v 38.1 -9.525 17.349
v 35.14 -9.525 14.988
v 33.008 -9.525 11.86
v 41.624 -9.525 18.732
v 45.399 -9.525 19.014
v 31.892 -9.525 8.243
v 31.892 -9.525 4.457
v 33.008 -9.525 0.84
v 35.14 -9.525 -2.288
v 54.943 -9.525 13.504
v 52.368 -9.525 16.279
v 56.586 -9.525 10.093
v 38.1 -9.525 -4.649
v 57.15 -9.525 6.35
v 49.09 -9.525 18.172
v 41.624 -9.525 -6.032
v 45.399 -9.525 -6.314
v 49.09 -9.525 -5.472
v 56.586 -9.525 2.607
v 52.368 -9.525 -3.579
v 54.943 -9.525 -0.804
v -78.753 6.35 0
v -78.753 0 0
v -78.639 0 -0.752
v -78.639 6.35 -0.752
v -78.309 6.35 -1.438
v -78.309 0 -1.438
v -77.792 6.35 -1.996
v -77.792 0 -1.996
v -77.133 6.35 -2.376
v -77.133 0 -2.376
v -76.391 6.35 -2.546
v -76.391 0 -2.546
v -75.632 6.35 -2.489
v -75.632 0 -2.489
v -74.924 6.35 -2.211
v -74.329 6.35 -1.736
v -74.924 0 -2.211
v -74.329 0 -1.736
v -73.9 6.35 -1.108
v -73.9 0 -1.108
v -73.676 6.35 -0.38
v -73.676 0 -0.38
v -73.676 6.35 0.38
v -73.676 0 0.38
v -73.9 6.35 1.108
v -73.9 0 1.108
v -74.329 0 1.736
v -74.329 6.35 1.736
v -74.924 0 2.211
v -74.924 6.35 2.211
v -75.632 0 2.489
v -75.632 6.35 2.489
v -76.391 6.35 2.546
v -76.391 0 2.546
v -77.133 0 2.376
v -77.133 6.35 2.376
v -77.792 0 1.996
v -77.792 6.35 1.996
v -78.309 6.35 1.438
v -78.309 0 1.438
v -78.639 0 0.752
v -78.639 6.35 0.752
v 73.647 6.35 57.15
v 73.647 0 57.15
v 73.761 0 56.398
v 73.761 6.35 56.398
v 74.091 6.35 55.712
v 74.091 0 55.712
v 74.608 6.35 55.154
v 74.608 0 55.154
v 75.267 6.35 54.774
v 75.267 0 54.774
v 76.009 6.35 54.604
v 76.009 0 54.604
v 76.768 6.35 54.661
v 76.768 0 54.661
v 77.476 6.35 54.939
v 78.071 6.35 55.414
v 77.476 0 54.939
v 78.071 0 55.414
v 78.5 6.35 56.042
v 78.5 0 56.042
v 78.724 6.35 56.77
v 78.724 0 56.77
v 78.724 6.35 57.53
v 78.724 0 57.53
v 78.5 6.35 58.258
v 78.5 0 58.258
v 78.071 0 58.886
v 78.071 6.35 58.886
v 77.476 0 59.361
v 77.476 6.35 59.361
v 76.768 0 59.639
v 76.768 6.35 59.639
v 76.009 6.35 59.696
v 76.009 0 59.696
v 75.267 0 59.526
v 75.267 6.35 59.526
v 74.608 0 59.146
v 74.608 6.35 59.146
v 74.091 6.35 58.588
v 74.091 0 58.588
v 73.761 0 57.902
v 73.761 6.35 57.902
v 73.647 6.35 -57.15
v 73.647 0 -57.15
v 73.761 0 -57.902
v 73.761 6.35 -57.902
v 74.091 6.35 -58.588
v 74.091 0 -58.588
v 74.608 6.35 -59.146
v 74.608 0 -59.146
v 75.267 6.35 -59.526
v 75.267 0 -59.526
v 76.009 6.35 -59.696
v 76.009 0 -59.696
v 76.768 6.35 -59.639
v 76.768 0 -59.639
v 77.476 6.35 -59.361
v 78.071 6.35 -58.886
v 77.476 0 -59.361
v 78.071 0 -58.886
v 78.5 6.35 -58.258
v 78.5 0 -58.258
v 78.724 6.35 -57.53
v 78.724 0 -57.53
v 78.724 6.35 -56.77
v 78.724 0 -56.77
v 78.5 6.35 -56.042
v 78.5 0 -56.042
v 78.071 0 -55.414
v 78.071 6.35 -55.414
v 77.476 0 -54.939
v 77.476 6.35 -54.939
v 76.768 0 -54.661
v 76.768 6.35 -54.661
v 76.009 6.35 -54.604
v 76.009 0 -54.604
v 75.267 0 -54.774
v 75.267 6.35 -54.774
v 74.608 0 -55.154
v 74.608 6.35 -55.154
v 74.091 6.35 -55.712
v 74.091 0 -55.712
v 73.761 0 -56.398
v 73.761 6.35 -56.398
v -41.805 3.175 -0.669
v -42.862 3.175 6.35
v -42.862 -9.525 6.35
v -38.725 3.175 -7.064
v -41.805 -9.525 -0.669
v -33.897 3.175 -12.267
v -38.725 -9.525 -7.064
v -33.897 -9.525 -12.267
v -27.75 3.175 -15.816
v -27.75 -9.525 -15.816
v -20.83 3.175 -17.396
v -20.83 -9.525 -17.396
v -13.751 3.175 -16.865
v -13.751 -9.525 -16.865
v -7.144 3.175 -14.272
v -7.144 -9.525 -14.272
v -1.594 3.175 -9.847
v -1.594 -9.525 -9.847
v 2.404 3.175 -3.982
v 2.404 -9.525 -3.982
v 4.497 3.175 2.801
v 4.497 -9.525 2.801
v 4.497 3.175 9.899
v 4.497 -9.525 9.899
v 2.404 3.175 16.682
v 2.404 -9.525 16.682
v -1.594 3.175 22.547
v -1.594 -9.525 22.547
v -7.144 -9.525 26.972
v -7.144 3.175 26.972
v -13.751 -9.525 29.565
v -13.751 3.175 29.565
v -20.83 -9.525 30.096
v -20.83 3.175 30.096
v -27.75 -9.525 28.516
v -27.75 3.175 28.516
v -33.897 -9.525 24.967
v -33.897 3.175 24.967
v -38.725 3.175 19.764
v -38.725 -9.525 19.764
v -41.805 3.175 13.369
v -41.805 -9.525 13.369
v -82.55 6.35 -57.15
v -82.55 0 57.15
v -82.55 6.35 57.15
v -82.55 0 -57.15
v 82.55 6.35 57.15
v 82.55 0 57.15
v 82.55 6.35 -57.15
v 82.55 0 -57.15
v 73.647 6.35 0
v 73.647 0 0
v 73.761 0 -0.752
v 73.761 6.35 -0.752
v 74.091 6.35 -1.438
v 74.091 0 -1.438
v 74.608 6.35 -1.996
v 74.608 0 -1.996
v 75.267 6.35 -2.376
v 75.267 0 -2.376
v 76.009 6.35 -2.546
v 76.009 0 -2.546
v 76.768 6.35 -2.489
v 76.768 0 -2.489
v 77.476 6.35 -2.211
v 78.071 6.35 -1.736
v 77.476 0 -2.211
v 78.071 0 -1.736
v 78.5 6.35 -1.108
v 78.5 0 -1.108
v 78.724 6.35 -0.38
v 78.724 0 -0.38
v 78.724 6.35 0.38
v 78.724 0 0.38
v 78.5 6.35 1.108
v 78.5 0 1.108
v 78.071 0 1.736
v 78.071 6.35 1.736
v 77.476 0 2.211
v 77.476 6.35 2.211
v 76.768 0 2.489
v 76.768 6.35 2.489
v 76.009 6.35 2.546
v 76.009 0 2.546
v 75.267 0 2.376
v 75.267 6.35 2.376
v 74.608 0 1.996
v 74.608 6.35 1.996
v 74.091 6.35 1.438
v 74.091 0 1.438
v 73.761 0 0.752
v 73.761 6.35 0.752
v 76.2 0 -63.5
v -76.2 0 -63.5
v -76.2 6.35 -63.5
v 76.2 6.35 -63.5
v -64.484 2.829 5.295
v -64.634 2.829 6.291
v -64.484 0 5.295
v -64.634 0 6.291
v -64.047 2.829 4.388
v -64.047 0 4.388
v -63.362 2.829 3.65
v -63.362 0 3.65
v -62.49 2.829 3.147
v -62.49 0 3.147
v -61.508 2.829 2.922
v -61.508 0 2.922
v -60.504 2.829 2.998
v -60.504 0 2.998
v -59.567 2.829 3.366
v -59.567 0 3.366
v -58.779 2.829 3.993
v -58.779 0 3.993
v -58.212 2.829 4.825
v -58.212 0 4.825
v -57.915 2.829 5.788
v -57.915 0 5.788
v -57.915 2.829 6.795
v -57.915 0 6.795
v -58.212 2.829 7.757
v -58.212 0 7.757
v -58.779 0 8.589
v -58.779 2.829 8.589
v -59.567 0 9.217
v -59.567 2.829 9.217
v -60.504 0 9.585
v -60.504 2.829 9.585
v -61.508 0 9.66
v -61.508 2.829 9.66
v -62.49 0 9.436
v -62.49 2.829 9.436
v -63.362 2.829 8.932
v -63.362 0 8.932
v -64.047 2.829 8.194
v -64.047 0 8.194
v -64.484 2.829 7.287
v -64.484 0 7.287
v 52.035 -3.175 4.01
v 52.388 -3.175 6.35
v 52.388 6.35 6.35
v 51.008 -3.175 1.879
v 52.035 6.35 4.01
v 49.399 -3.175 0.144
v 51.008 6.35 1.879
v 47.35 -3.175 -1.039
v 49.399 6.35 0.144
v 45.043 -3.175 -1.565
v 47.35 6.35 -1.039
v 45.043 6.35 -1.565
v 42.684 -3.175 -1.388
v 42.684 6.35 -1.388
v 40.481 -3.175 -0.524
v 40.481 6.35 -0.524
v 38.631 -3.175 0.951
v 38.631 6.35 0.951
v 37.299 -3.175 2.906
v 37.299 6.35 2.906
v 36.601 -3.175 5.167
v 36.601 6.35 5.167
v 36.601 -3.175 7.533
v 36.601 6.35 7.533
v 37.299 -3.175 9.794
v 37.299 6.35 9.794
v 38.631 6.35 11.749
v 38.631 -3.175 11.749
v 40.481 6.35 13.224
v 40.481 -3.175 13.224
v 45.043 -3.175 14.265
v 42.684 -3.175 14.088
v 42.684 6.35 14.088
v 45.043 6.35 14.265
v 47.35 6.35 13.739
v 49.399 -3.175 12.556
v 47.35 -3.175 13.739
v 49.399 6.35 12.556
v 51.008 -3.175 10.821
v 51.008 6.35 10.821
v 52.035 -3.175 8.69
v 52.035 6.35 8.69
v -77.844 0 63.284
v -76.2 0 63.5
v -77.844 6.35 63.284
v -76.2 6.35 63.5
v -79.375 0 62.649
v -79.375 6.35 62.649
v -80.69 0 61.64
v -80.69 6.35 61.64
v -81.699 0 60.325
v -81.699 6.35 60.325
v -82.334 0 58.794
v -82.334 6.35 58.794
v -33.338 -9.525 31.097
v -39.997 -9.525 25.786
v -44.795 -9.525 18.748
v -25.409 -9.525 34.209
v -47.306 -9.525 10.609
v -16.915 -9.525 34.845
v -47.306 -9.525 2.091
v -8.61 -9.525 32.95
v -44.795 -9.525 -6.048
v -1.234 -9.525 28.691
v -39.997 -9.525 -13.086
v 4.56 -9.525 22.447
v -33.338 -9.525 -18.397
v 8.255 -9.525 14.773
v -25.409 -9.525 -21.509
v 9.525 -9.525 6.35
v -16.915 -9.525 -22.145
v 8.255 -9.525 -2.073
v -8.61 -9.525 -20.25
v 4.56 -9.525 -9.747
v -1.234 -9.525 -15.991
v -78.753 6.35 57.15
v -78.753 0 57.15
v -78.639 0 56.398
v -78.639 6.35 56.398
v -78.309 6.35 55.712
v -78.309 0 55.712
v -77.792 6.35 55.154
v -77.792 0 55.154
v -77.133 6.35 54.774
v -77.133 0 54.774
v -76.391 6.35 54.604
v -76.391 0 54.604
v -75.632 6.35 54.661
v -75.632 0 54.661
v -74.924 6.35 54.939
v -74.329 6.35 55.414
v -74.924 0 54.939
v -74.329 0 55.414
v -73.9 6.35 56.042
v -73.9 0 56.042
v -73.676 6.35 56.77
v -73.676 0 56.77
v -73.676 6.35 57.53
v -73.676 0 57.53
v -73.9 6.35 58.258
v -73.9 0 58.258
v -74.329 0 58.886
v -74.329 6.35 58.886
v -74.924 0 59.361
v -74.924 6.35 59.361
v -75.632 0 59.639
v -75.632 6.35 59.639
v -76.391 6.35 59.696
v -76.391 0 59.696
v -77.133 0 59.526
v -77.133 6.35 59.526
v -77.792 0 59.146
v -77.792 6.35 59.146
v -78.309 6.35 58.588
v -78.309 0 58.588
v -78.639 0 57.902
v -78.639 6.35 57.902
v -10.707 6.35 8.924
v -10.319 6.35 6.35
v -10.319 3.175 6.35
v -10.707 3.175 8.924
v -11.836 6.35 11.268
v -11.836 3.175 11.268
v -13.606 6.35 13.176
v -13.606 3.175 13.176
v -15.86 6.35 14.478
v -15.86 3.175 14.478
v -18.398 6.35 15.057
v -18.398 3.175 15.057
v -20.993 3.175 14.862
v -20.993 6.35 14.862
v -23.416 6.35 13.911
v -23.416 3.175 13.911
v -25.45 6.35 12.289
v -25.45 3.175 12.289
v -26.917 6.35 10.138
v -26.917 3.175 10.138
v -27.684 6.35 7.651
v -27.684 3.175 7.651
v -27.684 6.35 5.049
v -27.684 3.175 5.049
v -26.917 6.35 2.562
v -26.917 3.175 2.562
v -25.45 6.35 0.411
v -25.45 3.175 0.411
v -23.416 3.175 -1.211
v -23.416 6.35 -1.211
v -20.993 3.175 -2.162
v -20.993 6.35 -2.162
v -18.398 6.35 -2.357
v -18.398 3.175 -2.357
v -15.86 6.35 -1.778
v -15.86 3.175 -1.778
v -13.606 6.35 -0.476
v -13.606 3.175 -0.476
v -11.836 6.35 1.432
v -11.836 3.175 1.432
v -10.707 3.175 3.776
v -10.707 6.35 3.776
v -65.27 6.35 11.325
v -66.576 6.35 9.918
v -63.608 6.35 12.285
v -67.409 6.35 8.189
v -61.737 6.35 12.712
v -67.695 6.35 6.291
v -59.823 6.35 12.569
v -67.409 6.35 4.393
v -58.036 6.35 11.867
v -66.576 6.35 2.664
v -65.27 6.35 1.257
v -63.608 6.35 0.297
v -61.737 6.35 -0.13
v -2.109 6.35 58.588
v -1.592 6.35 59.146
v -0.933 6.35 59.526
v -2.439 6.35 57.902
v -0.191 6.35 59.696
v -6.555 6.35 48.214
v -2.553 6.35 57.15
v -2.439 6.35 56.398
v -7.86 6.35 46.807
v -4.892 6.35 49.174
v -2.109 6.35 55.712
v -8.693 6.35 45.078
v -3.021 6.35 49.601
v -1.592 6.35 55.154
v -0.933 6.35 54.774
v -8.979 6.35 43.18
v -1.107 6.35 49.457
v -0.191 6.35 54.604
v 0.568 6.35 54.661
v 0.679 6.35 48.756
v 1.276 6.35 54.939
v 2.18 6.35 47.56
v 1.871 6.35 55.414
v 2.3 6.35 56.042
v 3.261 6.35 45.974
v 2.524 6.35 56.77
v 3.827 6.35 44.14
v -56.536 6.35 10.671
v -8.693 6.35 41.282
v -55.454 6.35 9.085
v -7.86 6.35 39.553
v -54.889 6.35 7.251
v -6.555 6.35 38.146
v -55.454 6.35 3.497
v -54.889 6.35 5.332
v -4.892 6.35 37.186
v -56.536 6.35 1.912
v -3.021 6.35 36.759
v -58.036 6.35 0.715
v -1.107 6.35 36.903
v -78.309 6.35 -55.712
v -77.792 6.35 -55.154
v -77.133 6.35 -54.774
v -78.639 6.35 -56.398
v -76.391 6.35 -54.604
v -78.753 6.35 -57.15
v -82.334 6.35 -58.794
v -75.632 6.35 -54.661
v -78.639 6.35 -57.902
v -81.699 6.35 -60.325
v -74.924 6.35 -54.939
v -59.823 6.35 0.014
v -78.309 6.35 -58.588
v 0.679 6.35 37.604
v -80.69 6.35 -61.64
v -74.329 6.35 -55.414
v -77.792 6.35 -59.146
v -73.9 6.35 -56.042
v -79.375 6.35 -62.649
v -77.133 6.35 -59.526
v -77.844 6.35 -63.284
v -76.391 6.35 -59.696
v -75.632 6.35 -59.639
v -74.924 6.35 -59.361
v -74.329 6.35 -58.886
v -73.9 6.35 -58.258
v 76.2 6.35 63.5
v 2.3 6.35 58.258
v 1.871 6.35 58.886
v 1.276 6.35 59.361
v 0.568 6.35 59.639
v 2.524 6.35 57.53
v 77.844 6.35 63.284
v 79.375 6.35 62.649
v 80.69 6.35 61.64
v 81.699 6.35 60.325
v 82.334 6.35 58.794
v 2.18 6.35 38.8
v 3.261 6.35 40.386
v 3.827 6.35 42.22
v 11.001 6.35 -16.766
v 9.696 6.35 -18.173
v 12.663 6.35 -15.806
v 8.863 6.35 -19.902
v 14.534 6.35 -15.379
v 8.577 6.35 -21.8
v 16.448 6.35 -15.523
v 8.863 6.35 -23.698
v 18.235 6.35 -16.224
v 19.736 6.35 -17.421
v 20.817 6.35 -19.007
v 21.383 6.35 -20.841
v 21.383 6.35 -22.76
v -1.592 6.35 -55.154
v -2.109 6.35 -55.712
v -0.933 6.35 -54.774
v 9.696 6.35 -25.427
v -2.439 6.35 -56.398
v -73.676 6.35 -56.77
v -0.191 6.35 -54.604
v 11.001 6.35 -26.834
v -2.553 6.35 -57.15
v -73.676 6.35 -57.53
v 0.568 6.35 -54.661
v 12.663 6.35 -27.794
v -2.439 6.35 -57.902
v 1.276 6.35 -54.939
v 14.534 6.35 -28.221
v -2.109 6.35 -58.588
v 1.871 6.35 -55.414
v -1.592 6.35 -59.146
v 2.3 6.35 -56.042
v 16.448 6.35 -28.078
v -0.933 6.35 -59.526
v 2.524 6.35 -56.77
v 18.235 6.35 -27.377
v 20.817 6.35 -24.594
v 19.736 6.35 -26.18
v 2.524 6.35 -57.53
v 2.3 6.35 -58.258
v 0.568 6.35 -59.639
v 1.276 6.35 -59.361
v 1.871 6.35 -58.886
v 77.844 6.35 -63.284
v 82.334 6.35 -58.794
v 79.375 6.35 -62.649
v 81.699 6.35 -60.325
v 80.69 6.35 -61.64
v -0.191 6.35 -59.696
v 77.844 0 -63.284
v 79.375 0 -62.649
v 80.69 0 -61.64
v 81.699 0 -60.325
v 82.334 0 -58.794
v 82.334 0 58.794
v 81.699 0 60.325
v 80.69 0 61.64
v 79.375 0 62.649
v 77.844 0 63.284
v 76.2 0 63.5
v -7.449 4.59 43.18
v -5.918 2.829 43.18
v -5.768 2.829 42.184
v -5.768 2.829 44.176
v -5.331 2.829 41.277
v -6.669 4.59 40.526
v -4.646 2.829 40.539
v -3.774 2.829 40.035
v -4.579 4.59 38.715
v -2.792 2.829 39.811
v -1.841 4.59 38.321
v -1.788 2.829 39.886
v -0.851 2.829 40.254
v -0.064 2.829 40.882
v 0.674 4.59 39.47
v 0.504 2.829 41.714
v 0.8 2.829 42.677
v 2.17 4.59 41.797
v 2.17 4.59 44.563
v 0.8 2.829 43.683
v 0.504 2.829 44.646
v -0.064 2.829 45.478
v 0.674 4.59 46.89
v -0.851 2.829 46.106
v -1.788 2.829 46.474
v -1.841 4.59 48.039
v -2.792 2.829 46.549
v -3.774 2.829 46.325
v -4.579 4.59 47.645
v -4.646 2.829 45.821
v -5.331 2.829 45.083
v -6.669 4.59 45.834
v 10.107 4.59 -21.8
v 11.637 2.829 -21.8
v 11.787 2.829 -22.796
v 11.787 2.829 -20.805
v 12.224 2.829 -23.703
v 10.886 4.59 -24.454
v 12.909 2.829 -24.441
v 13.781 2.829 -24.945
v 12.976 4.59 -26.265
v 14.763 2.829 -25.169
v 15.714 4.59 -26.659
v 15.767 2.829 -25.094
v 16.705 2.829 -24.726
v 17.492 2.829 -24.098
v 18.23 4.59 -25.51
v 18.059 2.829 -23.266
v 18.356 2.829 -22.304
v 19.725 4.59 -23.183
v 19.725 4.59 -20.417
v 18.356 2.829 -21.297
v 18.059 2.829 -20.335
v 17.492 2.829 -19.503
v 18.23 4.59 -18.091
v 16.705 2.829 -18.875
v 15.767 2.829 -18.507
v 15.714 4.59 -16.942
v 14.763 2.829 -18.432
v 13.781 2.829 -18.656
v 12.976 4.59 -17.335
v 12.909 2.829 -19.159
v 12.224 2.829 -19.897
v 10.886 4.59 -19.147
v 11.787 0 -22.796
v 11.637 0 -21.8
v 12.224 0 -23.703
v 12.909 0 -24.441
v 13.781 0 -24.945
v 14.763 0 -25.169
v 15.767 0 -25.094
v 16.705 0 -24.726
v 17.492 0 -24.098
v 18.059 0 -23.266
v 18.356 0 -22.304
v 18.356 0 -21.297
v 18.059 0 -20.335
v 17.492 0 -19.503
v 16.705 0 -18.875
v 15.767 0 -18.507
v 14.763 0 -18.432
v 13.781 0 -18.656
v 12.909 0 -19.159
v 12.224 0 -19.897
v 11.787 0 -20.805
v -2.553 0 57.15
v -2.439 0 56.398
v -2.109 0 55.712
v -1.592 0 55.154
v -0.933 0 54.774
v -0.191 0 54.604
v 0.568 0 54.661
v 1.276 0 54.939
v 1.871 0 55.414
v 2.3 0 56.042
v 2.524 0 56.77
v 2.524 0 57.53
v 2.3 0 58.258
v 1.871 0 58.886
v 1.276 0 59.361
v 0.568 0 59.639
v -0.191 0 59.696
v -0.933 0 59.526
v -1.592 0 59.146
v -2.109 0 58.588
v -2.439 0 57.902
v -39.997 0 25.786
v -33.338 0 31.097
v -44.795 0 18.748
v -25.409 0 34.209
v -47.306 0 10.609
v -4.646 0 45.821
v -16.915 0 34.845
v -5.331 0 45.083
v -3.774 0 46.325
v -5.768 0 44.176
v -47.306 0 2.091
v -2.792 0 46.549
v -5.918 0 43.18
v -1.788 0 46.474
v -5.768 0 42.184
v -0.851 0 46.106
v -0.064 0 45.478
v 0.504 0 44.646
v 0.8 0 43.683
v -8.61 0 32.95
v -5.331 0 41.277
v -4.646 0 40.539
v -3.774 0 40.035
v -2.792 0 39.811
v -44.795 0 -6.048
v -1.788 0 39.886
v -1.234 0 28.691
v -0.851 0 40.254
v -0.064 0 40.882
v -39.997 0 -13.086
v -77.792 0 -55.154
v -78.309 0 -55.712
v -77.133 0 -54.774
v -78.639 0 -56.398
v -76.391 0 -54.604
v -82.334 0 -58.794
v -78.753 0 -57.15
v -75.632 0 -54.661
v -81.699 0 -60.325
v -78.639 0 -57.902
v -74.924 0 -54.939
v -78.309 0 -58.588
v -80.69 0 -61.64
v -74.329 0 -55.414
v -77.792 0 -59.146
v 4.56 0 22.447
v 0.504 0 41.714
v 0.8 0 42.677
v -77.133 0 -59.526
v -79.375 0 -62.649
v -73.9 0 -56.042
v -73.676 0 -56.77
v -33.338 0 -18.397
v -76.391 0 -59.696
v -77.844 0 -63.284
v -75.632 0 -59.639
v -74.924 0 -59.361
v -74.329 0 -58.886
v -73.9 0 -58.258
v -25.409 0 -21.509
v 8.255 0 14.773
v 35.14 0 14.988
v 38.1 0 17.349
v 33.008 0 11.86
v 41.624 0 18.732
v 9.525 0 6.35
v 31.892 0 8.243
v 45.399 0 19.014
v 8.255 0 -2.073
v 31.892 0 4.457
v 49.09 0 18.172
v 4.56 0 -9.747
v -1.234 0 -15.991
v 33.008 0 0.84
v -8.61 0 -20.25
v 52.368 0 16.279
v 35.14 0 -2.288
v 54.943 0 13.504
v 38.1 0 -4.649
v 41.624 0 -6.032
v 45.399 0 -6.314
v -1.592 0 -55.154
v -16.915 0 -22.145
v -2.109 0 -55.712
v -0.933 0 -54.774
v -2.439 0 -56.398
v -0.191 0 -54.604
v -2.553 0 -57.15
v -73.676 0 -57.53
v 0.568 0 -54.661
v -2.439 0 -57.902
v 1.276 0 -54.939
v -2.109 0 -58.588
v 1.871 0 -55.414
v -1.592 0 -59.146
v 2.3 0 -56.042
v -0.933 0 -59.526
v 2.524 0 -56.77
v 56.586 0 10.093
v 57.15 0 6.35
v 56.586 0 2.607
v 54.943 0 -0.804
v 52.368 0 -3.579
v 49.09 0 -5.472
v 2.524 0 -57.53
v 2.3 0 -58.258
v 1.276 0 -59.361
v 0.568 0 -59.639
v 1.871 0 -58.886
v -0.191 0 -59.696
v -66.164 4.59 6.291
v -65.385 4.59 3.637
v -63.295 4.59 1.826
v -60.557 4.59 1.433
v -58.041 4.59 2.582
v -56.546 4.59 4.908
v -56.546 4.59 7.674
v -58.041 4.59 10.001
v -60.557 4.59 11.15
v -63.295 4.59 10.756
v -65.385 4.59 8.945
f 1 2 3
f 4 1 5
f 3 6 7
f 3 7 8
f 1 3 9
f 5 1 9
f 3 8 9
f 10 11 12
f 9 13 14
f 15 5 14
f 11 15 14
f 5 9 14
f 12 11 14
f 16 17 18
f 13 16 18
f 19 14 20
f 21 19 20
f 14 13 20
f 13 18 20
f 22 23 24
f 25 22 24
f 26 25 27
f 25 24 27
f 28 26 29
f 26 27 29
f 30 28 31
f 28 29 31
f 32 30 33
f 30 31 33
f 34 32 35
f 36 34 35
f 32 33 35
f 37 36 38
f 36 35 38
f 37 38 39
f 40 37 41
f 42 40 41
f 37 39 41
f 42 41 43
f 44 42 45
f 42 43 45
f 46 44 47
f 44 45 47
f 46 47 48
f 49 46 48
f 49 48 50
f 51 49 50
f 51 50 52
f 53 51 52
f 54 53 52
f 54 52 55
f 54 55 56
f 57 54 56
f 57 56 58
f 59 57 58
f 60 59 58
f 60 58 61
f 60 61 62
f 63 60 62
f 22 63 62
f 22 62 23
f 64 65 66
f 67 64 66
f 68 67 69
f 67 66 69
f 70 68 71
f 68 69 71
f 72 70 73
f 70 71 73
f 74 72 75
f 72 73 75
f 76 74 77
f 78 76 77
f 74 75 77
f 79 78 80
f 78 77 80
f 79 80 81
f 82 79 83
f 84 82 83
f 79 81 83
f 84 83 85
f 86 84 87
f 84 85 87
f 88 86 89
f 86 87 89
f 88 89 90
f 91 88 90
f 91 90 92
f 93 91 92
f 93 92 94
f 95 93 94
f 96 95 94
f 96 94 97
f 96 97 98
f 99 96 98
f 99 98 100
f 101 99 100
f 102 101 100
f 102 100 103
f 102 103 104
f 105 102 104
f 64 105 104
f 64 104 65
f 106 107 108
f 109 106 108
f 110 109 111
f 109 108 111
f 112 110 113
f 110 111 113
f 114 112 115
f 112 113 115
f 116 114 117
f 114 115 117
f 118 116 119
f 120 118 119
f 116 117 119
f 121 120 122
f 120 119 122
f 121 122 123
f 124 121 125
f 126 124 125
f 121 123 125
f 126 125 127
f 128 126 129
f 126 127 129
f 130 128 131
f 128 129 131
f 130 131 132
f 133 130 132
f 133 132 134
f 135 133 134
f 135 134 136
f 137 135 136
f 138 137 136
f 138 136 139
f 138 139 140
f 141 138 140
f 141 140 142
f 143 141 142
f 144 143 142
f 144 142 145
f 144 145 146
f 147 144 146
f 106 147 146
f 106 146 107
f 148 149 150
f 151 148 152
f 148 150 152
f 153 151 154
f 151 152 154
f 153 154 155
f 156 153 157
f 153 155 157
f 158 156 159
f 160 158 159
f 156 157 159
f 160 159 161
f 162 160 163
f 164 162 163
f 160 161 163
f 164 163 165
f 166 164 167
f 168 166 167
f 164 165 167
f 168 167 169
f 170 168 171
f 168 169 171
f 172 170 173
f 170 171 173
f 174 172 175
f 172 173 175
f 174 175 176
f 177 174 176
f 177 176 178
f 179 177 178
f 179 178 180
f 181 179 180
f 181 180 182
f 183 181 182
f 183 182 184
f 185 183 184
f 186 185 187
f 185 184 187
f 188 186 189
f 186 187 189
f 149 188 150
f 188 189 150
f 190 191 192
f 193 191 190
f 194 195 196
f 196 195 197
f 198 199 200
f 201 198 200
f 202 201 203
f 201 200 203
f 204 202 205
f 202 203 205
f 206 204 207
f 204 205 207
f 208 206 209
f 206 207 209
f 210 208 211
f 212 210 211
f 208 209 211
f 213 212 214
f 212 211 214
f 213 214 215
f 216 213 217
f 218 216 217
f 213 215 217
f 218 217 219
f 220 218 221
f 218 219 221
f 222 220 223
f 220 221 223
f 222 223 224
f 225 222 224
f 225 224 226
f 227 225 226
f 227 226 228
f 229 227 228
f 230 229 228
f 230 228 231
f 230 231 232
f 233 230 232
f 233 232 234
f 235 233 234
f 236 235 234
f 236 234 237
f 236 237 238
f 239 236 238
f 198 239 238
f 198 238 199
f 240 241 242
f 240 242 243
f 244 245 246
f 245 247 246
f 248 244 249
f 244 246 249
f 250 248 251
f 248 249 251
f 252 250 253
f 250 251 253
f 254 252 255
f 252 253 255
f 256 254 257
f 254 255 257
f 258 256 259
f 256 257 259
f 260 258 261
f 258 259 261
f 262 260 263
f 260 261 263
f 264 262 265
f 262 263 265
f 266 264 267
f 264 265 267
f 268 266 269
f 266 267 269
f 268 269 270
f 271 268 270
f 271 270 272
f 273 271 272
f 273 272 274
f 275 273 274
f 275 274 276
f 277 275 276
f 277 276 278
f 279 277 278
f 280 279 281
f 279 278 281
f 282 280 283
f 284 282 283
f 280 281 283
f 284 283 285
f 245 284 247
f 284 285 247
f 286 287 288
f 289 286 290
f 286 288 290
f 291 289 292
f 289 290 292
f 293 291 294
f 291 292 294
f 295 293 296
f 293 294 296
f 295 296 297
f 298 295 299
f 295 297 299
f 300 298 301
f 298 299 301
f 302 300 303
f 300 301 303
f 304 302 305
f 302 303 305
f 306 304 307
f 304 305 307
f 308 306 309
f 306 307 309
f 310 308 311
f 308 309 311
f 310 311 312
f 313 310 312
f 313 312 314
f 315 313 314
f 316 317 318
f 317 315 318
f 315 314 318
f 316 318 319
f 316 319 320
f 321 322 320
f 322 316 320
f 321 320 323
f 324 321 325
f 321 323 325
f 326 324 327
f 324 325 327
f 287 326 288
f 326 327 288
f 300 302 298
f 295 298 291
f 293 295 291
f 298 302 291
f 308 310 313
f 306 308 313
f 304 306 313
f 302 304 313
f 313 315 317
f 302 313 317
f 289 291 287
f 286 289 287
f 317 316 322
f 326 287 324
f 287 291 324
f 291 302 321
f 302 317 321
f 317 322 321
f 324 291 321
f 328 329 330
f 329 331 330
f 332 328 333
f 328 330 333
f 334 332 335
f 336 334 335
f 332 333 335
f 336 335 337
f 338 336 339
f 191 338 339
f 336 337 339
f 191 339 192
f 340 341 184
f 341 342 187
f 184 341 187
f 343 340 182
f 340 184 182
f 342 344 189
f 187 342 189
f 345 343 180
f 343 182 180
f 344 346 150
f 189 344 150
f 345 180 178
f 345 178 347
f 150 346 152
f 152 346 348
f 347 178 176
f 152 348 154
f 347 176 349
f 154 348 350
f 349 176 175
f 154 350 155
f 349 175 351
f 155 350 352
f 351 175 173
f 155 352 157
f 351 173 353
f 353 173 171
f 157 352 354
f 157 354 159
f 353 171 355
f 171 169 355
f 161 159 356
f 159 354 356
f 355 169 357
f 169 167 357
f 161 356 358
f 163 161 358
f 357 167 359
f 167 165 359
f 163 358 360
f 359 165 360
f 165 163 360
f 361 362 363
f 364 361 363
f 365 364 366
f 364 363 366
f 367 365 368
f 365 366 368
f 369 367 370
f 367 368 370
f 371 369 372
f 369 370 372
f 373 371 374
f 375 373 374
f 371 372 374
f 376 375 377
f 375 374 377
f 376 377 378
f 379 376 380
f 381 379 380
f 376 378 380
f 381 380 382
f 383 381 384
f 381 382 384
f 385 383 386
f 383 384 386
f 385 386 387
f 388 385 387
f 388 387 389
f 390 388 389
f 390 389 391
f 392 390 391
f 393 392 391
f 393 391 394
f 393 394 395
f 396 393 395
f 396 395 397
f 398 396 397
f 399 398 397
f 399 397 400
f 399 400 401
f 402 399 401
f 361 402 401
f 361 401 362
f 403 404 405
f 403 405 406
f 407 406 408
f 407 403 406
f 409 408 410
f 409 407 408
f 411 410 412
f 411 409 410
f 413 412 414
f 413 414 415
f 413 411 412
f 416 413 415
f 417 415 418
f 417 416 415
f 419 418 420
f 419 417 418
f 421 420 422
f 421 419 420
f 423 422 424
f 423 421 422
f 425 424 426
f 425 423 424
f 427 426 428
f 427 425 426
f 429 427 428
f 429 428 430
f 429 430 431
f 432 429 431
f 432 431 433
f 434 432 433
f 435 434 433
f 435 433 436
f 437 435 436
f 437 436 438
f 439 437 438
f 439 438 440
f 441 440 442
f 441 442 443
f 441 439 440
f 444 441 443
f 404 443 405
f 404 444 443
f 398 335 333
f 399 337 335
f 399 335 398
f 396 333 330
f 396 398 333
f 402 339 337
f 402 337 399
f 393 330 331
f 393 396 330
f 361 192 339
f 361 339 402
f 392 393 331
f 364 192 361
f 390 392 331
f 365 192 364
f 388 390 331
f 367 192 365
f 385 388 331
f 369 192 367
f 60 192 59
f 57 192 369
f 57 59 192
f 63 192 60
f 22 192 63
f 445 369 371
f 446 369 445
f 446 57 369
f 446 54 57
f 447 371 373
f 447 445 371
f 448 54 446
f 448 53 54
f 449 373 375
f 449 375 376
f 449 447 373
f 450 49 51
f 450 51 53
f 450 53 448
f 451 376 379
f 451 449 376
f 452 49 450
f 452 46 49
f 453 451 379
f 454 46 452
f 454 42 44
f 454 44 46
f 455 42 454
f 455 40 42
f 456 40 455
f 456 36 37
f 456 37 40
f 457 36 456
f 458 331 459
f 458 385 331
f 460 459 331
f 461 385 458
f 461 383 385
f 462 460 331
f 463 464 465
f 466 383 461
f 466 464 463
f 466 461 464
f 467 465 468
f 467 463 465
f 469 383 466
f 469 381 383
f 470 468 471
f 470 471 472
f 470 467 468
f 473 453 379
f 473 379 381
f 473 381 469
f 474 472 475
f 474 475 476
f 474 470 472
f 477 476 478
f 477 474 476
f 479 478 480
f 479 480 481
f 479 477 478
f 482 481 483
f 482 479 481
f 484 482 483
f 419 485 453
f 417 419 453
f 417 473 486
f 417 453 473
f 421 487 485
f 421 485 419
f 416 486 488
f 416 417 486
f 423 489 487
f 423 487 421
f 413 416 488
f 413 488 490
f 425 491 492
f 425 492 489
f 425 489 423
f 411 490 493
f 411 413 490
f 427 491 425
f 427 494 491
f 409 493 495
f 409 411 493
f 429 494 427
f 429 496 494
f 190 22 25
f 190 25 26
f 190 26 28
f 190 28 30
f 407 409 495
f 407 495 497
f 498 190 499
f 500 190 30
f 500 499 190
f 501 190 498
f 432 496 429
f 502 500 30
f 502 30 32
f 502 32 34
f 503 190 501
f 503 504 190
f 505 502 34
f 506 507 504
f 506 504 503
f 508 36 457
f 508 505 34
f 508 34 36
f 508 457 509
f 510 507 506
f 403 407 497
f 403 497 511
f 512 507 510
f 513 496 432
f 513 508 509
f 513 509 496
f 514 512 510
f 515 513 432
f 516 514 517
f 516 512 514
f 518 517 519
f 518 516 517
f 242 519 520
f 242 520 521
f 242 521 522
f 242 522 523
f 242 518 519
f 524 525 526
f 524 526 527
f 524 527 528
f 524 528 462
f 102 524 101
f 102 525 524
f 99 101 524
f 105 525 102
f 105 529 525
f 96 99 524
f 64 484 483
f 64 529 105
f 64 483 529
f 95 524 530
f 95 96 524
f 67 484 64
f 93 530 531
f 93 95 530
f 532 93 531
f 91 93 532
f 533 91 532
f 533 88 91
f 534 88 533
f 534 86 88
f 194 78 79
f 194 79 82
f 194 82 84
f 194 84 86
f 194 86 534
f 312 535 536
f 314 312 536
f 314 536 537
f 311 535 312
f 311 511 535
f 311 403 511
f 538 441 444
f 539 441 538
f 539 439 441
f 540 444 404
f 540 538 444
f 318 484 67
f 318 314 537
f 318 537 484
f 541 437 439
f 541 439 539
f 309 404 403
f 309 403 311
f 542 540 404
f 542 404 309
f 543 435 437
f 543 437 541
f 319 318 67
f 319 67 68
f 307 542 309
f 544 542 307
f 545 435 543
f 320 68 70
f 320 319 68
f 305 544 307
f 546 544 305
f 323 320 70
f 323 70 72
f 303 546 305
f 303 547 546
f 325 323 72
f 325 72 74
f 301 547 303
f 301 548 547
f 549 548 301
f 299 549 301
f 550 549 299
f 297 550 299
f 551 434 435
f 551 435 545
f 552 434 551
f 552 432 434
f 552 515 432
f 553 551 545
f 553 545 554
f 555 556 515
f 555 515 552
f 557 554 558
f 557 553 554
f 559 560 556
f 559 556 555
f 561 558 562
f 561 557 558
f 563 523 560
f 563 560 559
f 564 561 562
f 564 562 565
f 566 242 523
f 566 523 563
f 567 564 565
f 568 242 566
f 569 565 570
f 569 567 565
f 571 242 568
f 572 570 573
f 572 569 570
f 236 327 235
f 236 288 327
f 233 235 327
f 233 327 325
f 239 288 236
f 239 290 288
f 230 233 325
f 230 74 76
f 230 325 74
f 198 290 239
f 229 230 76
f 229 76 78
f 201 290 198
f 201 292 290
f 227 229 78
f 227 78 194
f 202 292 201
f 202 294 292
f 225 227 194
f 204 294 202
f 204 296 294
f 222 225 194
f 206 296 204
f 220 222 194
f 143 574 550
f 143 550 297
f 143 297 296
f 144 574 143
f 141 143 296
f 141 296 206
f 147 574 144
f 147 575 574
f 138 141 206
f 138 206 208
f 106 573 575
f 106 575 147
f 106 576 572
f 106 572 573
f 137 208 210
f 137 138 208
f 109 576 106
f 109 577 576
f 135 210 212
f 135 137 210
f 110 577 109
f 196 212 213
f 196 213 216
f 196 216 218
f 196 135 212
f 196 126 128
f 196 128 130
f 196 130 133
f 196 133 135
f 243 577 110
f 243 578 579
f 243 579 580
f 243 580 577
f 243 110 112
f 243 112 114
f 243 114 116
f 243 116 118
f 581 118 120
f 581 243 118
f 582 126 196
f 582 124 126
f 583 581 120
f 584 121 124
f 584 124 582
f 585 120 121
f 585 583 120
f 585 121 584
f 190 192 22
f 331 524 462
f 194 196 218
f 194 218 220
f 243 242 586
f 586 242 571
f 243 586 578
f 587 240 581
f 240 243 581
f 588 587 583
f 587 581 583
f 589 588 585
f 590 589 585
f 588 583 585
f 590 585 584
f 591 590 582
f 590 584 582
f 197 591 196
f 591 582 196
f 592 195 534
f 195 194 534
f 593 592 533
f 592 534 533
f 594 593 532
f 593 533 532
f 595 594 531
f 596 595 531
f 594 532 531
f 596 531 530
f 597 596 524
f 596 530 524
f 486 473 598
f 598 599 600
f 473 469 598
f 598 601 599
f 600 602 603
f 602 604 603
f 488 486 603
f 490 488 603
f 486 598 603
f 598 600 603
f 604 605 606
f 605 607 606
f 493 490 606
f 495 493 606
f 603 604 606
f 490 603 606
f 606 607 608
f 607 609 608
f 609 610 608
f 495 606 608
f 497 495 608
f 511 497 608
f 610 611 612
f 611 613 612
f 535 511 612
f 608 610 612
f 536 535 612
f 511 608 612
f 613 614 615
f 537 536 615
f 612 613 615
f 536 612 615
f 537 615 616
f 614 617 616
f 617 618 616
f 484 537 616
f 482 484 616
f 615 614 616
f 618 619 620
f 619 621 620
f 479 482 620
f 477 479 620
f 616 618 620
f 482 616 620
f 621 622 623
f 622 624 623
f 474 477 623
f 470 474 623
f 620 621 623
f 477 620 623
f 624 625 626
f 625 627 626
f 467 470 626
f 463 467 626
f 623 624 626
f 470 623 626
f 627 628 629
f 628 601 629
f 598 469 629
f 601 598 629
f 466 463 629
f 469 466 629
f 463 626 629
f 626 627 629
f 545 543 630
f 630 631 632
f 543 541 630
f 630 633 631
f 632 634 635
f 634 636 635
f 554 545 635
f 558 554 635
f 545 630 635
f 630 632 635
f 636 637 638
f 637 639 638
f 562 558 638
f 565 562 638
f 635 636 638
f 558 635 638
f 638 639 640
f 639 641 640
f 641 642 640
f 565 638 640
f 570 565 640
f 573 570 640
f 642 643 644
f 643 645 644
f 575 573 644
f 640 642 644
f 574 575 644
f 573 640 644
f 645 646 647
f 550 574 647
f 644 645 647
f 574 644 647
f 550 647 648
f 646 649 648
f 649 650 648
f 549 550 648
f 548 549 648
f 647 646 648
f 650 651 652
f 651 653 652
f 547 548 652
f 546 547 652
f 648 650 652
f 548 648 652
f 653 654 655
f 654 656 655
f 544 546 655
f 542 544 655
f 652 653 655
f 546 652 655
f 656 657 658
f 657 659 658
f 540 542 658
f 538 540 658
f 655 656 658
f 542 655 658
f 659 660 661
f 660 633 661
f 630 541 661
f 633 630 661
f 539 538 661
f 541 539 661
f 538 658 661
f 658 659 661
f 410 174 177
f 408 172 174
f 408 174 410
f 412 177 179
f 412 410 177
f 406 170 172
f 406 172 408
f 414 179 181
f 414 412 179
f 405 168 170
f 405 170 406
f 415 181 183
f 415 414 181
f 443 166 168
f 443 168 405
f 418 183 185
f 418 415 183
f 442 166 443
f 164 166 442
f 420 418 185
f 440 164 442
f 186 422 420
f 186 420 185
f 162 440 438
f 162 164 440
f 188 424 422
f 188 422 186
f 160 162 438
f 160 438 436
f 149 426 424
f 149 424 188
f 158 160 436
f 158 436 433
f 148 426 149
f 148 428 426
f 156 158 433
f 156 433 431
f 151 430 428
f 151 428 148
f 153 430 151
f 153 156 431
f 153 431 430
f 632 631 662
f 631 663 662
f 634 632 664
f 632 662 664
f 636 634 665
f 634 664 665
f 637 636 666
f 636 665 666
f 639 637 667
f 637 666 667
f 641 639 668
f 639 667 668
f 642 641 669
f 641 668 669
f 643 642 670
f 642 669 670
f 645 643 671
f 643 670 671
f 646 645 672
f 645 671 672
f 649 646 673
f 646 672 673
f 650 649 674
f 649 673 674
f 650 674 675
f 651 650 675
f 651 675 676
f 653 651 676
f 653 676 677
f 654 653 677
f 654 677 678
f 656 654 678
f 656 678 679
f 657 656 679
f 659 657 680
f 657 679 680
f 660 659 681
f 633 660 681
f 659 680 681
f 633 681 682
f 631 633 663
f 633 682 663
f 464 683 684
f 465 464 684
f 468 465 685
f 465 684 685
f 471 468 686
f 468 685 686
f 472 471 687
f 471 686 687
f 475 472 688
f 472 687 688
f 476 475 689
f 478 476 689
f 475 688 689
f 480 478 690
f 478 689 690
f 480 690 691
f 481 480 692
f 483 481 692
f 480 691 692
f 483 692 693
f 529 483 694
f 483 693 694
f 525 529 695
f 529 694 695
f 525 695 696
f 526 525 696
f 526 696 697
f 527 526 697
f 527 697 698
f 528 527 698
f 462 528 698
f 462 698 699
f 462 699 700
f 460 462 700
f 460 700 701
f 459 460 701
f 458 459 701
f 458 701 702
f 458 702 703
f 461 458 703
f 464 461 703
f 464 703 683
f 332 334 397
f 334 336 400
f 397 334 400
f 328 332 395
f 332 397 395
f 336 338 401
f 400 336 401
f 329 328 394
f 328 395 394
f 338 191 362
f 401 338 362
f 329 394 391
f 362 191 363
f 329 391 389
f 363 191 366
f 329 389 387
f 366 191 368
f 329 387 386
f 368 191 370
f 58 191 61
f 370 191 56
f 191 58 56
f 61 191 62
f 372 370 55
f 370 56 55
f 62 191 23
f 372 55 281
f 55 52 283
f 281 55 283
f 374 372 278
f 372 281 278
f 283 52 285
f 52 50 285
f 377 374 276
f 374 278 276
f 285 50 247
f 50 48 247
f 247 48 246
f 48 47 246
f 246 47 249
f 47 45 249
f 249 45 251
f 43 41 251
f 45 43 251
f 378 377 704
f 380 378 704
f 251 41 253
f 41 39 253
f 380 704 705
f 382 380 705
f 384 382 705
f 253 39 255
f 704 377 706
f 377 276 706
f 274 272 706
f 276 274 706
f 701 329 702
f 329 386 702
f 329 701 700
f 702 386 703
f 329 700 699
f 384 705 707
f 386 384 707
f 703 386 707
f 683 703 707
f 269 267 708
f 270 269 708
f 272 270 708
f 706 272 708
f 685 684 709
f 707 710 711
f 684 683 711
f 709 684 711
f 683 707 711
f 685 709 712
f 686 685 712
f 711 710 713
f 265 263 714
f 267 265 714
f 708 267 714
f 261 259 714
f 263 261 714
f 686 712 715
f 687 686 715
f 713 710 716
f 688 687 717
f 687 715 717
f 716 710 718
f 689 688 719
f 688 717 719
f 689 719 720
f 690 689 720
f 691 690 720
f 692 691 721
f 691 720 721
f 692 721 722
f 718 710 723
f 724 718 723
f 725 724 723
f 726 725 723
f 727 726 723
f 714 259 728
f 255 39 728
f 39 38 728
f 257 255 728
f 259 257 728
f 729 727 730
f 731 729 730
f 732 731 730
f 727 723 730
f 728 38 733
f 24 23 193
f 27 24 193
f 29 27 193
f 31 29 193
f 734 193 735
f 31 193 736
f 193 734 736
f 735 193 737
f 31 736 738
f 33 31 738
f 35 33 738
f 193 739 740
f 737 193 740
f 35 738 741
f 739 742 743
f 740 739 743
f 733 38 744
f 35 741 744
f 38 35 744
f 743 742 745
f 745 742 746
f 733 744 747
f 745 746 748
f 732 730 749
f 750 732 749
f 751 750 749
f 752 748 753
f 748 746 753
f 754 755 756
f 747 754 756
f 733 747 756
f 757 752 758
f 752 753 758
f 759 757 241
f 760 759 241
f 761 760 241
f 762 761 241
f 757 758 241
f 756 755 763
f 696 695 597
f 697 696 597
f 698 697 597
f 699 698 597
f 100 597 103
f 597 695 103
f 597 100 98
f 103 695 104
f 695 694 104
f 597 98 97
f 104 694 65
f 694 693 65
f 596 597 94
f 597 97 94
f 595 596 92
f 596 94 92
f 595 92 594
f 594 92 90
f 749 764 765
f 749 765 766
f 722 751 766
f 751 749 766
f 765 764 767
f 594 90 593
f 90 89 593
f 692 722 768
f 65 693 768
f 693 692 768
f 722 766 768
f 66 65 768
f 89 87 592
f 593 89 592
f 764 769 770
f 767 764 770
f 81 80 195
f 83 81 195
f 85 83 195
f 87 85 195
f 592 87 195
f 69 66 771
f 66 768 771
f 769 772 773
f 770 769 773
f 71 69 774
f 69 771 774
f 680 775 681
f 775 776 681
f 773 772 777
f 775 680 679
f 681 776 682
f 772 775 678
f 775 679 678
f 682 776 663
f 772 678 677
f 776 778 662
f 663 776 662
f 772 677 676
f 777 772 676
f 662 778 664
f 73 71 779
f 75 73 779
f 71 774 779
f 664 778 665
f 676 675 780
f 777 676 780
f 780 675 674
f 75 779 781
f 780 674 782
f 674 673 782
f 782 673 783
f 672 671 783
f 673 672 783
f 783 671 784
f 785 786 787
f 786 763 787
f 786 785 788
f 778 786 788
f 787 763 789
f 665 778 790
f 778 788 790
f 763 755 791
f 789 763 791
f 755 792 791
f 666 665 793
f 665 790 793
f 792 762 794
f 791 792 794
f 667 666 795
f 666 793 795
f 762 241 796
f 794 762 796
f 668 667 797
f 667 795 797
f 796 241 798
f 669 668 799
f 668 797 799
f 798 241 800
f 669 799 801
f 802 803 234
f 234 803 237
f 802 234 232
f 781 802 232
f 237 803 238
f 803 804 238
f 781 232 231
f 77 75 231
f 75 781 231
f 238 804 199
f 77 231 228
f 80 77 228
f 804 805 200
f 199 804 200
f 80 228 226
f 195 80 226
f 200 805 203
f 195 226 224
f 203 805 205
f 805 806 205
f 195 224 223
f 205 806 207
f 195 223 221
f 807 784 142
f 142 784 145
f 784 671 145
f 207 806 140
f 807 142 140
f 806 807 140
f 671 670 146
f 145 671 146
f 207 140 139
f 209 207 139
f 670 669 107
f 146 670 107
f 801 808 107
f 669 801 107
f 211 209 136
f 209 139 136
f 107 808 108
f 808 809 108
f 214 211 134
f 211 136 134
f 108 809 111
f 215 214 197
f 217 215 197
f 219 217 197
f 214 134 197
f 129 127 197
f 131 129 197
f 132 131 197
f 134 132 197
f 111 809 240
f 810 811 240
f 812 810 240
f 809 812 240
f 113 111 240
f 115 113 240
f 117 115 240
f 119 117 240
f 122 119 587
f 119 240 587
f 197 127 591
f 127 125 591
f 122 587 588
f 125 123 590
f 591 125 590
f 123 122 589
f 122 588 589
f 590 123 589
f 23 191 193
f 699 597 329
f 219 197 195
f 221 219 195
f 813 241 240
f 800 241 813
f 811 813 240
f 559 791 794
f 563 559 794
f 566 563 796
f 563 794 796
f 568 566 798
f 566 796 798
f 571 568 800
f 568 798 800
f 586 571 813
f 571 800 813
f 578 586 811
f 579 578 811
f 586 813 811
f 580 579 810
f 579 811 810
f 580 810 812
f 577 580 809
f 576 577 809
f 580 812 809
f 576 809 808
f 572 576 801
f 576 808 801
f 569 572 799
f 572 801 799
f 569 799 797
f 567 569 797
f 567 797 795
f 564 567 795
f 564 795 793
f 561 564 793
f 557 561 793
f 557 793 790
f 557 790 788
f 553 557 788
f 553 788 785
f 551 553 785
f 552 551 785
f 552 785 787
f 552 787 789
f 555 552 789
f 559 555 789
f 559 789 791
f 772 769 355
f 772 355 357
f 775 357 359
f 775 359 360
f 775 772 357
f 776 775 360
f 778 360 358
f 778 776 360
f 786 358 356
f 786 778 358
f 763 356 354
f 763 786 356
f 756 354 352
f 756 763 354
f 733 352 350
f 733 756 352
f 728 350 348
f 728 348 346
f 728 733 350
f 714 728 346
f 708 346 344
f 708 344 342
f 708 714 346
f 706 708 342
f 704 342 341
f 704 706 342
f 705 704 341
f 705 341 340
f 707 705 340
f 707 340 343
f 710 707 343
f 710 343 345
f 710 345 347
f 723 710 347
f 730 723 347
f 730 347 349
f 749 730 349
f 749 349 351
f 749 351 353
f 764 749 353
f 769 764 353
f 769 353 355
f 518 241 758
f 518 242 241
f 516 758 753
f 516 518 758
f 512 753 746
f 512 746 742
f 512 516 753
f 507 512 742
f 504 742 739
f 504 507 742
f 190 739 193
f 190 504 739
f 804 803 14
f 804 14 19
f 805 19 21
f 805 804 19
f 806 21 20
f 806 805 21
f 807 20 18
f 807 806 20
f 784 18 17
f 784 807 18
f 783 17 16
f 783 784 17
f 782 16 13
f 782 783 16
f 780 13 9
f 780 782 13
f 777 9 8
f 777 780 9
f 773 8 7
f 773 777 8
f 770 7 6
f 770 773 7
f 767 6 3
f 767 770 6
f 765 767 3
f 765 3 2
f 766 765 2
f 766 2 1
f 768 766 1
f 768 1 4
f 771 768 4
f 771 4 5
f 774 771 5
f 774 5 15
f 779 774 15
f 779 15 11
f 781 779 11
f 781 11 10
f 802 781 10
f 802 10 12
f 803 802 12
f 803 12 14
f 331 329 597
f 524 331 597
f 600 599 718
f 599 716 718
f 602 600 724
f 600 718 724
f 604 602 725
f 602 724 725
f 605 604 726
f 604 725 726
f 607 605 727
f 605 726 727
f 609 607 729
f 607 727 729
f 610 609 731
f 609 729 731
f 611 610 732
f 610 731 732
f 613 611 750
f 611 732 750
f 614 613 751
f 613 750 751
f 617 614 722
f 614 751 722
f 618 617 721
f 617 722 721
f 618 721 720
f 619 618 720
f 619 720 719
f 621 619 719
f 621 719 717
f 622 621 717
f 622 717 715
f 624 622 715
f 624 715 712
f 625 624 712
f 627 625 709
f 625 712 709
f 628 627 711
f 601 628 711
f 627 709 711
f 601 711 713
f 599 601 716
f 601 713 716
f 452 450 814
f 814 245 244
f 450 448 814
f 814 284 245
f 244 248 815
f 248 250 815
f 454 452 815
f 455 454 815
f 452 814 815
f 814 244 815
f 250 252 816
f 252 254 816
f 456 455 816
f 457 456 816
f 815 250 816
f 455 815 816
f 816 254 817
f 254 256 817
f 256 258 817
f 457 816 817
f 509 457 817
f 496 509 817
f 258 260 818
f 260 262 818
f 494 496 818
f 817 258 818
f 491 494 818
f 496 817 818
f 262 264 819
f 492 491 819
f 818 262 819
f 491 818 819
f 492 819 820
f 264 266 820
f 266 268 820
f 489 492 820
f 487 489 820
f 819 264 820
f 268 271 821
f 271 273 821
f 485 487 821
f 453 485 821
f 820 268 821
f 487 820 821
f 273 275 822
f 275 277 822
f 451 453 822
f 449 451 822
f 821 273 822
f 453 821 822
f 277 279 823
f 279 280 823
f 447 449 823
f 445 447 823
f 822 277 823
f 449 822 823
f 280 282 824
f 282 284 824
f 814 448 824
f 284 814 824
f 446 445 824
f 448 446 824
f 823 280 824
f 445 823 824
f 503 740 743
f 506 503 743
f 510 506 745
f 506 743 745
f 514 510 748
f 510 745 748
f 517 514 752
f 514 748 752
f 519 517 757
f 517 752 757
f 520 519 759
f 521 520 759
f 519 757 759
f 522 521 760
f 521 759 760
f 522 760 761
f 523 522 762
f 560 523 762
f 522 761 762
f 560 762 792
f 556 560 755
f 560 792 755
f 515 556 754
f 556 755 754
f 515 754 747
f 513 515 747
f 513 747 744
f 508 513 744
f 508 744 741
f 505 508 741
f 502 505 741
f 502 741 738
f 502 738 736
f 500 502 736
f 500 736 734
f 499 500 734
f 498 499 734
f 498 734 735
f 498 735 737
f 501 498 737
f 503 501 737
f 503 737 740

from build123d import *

# Parameters (mm, degrees)
SKETCH1_W                                        = 165.1
SKETCH1_H                                        = 127
SKETCH1_R                                        = 7.14375
SKETCH1_R_2                                      = 7.9375
BOSS_EXTRUDE1_DEPTH                              = 6.35
SKETCH2_R                                        = 28.575
SKETCH2_R_2                                      = 7.14375
SKETCH2_R_3                                      = 12.7
SKETCH2_R_4                                      = 7.9375
BOSS_EXTRUDE2_DEPTH                              = 15.875
SKETCH3_R                                        = 8.73125
CUT_EXTRUDE1_DEPTH                               = 3.175
SKETCH4_R                                        = 23.8125
CUT_EXTRUDE2_DEPTH                               = 12.7
BOSS_EXTRUDE4_START                              = 3.175
SKETCH5_R                                        = 7.9375
BOSS_EXTRUDE4_DEPTH                              = 6.35
CSK_FOR_1_4_FLAT_HEAD_MACHINE_SCREW1_D           = 6.7564
CSK_FOR_1_4_FLAT_HEAD_MACHINE_SCREW1_CSINK_D     = 12.8778
CSK_FOR_1_4_FLAT_HEAD_MACHINE_SCREW1_CSINK_ANGLE = 82
FILLET1_R                                        = 6.35
F_10_CLEARANCE_HOLE1_D                           = 5.1054


with BuildPart() as part:
    # Sketch1 → Boss-Extrude1 (new body)
    with BuildSketch(Plane(origin=(0, 0, 0), x_dir=(1, 0, 0), z_dir=(0, 1, 0))):
        Rectangle(SKETCH1_W, SKETCH1_H)
        with Locations((-19.05, -6.35)):
            Circle(SKETCH1_R, mode=Mode.SUBTRACT)
        with Locations((44.45, -6.35)):
            Circle(SKETCH1_R_2, mode=Mode.SUBTRACT)
    extrude(amount=BOSS_EXTRUDE1_DEPTH)

    # Sketch2 → Boss-Extrude2 (add)
    with BuildSketch(Plane(origin=(0, 6.35, 0), x_dir=(1, 0, 0), z_dir=(0, 1, 0))):
        with Locations((-19.05, -6.35)):
            Circle(SKETCH2_R)
        with Locations((-19.05, -6.35)):
            Circle(SKETCH2_R_2, mode=Mode.SUBTRACT)
        with Locations((44.45, -6.35)):
            Circle(SKETCH2_R_3)
        with Locations((44.45, -6.35)):
            Circle(SKETCH2_R_4, mode=Mode.SUBTRACT)
    extrude(amount=-BOSS_EXTRUDE2_DEPTH)

    # Sketch3 → Cut-Extrude1 (cut)
    with BuildSketch(Plane.XZ.offset(-6.35)):
        with Locations((-19.05, 6.35)):
            Circle(SKETCH3_R)
    extrude(amount=CUT_EXTRUDE1_DEPTH, mode=Mode.SUBTRACT)

    # Sketch4 → Cut-Extrude2 (cut)
    with BuildSketch(Plane(origin=(0, -9.525, 0), x_dir=(-1, 0, 0), z_dir=(0, -1, 0))):
        with Locations((19.05, -6.35)):
            Circle(SKETCH4_R)
    extrude(amount=-CUT_EXTRUDE2_DEPTH, mode=Mode.SUBTRACT)

    # Sketch5 → Boss-Extrude4 (add)
    with BuildSketch(Plane.XZ.offset(BOSS_EXTRUDE4_START)):
        with Locations((44.45, 6.35)):
            Circle(SKETCH5_R)
    extrude(amount=BOSS_EXTRUDE4_DEPTH)

    # CSK for 1/4 Flat Head Machine Screw1 (through all)
    with Locations(Plane(origin=(0, 6.35, 0), x_dir=(1, 0, 0), z_dir=(0, 1, 0))):
        with Locations((-61.255686472, -6.291233063), (15.015571308, 21.800289443), (-2.54, -43.18)):
            CounterSinkHole(CSK_FOR_1_4_FLAT_HEAD_MACHINE_SCREW1_D / 2, CSK_FOR_1_4_FLAT_HEAD_MACHINE_SCREW1_CSINK_D / 2, counter_sink_angle=CSK_FOR_1_4_FLAT_HEAD_MACHINE_SCREW1_CSINK_ANGLE)

    # Fillet1
    fillet1_edges = [part.edges().sort_by_distance(p)[0] for p in [
        (-82.55, 3.175, -63.5),
        (82.55, 3.175, -63.5),
        (82.55, 3.175, 63.5),
        (-82.55, 3.175, 63.5),
    ]]
    fillet(fillet1_edges, radius=FILLET1_R)

    # #10 Clearance Hole1 (through all)
    with Locations(Plane(origin=(0, 6.35, 0), x_dir=(1, 0, 0), z_dir=(0, 1, 0))):
        with Locations((-76.2, -57.15), (-76.2, 57.15), (76.2, 57.15), (76.2, -57.15), (0, 57.15), (0, -57.15), (-76.2, 0), (76.2, 0)):
            Hole(F_10_CLEARANCE_HOLE1_D / 2)


solid = part.part
